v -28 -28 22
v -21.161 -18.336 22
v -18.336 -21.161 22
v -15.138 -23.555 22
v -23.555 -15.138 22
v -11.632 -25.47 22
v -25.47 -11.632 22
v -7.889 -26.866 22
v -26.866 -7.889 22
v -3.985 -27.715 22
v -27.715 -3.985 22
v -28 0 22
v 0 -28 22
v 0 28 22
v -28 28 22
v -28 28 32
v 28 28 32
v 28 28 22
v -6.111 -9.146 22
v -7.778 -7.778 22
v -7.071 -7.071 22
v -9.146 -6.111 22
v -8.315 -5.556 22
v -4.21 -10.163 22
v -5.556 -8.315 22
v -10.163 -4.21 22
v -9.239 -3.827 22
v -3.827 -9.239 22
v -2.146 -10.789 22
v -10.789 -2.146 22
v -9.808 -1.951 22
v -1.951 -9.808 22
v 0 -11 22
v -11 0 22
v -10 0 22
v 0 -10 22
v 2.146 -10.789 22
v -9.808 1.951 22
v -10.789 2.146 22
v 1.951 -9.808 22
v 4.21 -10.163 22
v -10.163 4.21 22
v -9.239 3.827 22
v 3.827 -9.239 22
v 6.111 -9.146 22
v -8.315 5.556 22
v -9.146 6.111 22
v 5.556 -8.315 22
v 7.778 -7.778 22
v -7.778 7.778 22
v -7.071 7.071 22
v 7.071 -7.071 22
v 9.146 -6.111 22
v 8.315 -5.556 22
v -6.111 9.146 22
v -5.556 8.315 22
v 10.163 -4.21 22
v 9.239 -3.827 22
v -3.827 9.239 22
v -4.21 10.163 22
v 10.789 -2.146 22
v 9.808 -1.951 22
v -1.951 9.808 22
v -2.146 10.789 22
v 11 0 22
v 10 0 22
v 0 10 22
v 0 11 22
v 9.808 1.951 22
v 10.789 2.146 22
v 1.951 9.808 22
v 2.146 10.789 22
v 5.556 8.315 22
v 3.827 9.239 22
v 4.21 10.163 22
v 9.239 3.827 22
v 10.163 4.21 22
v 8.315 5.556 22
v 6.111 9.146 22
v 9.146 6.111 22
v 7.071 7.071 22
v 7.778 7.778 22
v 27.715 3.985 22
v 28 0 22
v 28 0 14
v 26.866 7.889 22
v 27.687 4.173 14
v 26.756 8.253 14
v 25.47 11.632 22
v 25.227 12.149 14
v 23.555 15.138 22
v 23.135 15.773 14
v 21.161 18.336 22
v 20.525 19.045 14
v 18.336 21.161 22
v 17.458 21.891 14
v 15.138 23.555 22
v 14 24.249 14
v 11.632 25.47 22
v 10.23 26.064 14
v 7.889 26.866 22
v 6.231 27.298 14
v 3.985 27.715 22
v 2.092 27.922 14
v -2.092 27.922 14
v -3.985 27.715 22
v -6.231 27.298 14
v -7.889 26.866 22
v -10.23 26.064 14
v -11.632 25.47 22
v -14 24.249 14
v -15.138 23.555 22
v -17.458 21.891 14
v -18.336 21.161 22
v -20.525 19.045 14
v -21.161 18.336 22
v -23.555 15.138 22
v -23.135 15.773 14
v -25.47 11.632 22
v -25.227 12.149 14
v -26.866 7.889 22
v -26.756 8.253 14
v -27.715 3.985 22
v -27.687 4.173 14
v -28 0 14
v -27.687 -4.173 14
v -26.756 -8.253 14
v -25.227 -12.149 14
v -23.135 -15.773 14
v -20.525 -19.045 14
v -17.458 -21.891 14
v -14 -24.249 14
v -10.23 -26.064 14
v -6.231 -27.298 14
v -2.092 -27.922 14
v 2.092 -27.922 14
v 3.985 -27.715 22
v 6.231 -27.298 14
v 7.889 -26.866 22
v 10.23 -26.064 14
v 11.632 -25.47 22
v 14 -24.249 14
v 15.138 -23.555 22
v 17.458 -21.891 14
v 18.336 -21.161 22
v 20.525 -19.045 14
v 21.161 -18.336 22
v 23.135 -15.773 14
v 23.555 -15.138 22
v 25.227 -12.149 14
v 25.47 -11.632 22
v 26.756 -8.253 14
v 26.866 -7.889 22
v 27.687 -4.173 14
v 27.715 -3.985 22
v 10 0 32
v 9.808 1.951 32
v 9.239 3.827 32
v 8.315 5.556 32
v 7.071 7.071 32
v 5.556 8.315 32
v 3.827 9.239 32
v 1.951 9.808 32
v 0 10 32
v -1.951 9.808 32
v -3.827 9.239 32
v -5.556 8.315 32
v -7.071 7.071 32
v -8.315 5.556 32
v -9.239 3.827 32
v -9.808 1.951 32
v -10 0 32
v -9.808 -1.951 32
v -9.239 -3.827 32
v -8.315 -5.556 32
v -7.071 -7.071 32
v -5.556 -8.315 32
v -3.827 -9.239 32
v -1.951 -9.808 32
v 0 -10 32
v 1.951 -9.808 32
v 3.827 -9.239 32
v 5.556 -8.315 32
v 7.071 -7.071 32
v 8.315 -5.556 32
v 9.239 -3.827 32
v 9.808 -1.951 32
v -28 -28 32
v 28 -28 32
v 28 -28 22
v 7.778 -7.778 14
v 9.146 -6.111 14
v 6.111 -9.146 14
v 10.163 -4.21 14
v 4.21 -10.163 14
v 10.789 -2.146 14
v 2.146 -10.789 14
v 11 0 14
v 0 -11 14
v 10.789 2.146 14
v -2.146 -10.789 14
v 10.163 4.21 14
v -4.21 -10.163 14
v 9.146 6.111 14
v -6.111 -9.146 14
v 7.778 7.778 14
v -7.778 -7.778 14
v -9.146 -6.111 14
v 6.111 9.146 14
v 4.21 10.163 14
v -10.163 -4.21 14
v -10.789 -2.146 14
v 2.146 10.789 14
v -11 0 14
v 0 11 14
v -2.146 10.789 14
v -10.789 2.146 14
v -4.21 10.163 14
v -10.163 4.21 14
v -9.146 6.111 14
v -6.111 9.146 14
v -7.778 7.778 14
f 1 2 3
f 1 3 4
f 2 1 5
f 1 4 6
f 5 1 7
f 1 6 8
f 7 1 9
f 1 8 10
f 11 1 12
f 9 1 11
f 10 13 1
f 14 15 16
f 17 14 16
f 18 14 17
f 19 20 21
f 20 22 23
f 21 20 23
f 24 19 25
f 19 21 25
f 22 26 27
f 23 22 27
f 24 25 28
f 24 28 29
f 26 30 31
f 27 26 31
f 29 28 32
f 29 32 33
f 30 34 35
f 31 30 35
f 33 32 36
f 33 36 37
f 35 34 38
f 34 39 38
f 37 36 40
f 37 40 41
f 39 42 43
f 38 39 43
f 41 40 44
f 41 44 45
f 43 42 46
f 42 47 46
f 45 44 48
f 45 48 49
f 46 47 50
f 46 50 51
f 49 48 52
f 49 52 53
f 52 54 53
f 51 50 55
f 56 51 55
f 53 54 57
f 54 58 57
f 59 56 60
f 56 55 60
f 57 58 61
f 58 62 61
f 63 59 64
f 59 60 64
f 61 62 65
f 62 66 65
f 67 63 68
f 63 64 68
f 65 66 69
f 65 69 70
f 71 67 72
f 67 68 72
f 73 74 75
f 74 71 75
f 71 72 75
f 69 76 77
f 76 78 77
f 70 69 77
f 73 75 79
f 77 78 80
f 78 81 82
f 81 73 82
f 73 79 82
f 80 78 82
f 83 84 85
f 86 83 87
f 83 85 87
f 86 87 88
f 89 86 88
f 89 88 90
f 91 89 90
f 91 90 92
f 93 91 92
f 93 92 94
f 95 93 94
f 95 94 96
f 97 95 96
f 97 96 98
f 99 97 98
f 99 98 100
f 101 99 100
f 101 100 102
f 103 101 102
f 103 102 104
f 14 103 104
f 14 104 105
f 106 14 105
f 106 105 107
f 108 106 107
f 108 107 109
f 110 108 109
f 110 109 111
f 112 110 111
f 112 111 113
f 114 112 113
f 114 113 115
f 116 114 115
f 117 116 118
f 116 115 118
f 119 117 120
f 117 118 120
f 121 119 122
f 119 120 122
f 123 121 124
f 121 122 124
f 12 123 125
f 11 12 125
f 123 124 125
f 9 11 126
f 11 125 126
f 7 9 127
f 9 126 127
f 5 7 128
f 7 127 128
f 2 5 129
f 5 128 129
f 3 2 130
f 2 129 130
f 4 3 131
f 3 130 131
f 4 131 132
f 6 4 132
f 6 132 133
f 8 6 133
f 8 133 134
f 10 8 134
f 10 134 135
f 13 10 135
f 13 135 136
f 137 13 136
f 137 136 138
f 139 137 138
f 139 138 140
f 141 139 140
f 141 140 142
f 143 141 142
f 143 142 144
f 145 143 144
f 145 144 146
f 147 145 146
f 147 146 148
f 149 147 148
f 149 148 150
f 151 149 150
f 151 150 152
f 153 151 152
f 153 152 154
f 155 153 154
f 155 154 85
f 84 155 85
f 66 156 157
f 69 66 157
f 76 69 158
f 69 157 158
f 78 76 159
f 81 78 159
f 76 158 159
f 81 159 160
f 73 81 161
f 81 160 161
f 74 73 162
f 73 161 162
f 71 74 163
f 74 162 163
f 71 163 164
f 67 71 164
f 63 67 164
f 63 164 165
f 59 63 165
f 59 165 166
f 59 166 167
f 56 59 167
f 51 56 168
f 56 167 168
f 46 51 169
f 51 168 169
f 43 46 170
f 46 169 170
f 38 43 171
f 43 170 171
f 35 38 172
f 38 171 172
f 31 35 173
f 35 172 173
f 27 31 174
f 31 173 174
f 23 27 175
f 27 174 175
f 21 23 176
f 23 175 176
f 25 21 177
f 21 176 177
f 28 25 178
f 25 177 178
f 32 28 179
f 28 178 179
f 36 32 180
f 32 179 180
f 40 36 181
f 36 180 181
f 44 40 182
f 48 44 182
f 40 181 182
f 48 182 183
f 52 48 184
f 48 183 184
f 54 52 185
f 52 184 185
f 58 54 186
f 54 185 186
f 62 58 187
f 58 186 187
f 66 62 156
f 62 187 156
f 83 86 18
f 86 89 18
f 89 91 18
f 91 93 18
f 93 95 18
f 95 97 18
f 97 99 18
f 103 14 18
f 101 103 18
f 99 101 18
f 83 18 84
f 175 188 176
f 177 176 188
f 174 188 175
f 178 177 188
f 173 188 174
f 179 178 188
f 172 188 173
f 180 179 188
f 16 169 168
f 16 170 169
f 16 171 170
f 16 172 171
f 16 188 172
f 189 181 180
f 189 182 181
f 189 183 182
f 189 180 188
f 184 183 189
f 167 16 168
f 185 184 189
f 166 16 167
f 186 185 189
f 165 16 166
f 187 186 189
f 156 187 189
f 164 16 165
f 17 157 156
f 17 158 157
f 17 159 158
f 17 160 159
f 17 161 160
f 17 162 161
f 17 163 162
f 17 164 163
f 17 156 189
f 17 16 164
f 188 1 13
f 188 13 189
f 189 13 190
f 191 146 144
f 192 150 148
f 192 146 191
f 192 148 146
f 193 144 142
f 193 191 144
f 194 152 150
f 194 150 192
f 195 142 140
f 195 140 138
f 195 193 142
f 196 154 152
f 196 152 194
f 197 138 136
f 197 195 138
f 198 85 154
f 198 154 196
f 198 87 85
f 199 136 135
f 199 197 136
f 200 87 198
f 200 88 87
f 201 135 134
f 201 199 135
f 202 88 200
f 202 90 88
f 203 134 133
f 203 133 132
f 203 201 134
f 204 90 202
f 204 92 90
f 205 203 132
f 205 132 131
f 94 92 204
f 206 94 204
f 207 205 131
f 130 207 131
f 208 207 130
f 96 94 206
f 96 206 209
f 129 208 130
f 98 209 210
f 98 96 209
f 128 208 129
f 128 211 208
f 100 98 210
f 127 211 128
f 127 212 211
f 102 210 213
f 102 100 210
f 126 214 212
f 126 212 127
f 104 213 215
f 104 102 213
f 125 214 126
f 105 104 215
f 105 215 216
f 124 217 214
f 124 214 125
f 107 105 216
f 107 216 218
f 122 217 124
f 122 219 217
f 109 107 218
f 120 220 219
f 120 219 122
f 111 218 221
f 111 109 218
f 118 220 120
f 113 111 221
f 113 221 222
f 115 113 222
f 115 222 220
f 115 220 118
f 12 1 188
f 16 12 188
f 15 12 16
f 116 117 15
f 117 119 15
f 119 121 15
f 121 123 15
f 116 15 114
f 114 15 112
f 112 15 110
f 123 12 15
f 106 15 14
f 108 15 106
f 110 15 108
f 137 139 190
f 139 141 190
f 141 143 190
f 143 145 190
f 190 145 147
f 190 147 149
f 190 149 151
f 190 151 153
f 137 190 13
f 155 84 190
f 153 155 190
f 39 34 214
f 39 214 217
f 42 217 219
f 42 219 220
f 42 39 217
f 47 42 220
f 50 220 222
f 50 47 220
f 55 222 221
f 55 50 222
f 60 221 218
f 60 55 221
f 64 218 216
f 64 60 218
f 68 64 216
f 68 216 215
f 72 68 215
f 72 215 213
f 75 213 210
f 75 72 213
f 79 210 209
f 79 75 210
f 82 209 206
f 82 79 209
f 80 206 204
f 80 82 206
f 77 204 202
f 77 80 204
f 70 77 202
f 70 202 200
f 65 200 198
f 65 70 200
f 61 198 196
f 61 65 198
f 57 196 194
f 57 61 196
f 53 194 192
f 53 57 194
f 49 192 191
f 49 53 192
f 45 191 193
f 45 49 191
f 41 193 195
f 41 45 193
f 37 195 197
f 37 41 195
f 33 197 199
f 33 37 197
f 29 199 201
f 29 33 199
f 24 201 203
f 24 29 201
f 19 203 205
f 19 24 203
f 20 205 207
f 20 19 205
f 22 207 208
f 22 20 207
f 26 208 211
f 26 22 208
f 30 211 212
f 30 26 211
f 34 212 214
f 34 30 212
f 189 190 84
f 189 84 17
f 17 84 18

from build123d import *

# Parameters (mm, degrees)
SKETCH1_R           = 28
SKETCH1_R_2         = 18
BOSS_EXTRUDE1_DEPTH = 22
SKETCH2_W           = 56
SKETCH2_H           = 56
BOSS_EXTRUDE2_DEPTH = 10
CUT_EXTRUDE1_DEPTH  = 14
SKETCH4_R           = 5
CUT_EXTRUDE2_DEPTH  = 14
SKETCH5_R           = 21.225012464
SKETCH5_R_2         = 11
BOSS_EXTRUDE3_DEPTH = 8
SKETCH6_R           = 50.391738165
CUT_EXTRUDE3_DEPTH  = 14
SKETCH9_R           = 10
CUT_EXTRUDE6_DEPTH  = 10


with BuildPart() as part:
    # Sketch1 → Boss-Extrude1 (new body)
    with BuildSketch(Plane.XY):
        Circle(SKETCH1_R)
        Circle(SKETCH1_R_2, mode=Mode.SUBTRACT)
    extrude(amount=BOSS_EXTRUDE1_DEPTH)

    # Sketch2 → Boss-Extrude2 (add)
    with BuildSketch(Plane.XY.offset(22)):
        Rectangle(SKETCH2_W, SKETCH2_H)
    extrude(amount=BOSS_EXTRUDE2_DEPTH)

    # Sketch3 → Cut-Extrude1 (cut)
    with BuildSketch(Plane(origin=(0, 0, 0), x_dir=(-1, 0, 0), z_dir=(0, 0, -1))):
        Polygon((0, 0), (-28, -28), (28, -28), align=None)
    extrude(amount=-CUT_EXTRUDE1_DEPTH, mode=Mode.SUBTRACT)

    # Sketch4 → Cut-Extrude2 (cut)
    with BuildSketch(Plane(origin=(0, 0, 22), x_dir=(-1, 0, 0), z_dir=(0, 0, -1))):
        Circle(SKETCH4_R)
    extrude(amount=-CUT_EXTRUDE2_DEPTH, mode=Mode.SUBTRACT)

    # Sketch5 → Boss-Extrude3 (add)
    with BuildSketch(Plane(origin=(0, 0, 22), x_dir=(-1, 0, 0), z_dir=(0, 0, -1))):
        Circle(SKETCH5_R)
        Circle(SKETCH5_R_2, mode=Mode.SUBTRACT)
    extrude(amount=BOSS_EXTRUDE3_DEPTH)

    # Sketch6 → Cut-Extrude3 (cut)
    with BuildSketch(Plane(origin=(0, 0, 0), x_dir=(-1, 0, 0), z_dir=(0, 0, -1))):
        Circle(SKETCH6_R)
    extrude(amount=-CUT_EXTRUDE3_DEPTH, mode=Mode.SUBTRACT)

    # Sketch9 → Cut-Extrude6 (cut)
    with BuildSketch(Plane.XY.offset(32)):
        Circle(SKETCH9_R)
    extrude(amount=-CUT_EXTRUDE6_DEPTH, mode=Mode.SUBTRACT)


solid = part.part
